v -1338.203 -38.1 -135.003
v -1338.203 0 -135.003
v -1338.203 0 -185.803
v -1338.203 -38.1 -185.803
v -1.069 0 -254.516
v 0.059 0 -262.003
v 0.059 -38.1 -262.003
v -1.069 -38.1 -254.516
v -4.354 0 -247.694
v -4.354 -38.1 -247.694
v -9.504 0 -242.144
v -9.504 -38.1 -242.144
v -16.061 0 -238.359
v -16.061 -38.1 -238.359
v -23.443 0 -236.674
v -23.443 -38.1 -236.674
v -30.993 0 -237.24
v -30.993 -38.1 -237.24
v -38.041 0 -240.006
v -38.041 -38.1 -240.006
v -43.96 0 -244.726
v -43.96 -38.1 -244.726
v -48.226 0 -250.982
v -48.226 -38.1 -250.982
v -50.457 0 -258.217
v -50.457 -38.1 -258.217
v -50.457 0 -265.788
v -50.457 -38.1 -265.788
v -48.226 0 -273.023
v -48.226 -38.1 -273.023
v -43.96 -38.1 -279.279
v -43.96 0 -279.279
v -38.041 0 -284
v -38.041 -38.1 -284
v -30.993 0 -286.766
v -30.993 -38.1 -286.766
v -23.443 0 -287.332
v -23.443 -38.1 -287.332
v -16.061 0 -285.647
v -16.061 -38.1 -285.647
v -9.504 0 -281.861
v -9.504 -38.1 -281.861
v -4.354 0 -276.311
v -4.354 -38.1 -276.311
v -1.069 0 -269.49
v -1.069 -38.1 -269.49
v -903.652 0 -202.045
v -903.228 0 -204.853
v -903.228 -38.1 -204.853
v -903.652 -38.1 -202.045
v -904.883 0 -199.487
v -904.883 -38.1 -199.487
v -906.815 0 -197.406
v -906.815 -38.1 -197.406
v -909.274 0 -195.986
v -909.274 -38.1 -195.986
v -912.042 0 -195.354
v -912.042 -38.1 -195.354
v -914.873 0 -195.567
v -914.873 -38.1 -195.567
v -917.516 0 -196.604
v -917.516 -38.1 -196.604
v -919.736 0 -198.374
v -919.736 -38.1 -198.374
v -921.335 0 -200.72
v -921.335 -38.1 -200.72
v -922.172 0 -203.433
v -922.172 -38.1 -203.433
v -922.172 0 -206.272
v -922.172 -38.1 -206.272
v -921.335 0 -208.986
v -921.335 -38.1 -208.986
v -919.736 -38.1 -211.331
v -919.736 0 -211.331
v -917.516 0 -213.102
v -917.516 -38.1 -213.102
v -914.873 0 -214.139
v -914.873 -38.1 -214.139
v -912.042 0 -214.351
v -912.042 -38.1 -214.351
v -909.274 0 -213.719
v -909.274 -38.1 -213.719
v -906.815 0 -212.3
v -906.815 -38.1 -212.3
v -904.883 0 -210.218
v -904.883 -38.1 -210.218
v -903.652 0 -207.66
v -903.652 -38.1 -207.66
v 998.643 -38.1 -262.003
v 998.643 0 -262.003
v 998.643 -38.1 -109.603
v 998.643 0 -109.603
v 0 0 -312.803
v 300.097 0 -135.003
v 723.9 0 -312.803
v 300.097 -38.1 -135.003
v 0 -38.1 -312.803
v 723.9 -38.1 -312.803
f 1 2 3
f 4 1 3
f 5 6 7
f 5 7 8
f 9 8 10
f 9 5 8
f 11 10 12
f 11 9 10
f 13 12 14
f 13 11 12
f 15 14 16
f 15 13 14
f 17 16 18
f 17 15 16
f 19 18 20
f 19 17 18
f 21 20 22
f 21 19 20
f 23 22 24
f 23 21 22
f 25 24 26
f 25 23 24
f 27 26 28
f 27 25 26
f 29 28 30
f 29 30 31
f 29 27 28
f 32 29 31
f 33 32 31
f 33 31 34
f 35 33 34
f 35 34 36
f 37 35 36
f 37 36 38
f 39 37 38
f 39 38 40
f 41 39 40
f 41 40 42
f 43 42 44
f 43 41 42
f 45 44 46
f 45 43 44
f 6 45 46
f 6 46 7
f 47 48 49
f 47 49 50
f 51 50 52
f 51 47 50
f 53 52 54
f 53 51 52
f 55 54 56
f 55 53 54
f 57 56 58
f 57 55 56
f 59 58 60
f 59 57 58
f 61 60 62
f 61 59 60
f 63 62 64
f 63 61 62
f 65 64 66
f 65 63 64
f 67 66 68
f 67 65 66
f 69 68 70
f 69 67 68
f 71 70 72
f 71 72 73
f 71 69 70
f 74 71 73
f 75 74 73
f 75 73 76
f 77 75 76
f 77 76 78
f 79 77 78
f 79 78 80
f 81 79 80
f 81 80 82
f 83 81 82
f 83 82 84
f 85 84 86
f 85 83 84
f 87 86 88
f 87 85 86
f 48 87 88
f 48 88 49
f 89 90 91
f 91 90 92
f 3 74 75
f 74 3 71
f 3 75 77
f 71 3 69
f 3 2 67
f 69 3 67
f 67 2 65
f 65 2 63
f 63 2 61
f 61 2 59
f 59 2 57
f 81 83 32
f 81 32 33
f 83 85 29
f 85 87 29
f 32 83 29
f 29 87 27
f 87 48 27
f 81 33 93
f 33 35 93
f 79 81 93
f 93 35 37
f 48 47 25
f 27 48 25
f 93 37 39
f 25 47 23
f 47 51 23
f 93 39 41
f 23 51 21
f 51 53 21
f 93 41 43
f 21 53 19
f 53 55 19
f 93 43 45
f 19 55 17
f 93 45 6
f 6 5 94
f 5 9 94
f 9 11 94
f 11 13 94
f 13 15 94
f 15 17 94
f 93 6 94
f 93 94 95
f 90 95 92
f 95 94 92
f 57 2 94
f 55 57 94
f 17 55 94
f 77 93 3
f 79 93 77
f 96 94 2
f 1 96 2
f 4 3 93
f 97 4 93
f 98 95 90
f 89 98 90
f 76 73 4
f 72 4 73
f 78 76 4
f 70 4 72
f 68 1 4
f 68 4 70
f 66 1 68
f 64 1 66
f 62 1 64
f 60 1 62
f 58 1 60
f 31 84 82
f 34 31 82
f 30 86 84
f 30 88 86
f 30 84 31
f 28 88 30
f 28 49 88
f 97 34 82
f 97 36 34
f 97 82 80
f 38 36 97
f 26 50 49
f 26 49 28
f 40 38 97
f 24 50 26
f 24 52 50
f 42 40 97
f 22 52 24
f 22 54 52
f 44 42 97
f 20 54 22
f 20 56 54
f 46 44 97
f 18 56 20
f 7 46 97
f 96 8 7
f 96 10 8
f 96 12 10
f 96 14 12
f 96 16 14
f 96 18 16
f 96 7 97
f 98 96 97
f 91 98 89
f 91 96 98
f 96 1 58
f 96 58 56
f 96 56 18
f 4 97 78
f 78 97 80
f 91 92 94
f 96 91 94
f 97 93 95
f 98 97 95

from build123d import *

# Parameters (mm, degrees)
F0_R     = 25.4
F0_R_2   = 9.525
F1_DEPTH = 38.1


with BuildPart() as f1:
    # F0 (on Front) → F1 (new body)
    with BuildSketch(Plane.XZ):
        Polygon((300.096595, -135.002792), (-1338.203405, -135.002792), (-1338.203405, -185.802792), (0, -312.802792), (723.9, -312.802792), (998.643007, -262.002792), (998.643007, -109.602792), align=None)
        with Locations((-25.340905, -262.002792)):
            Circle(F0_R, mode=Mode.SUBTRACT)
        with Locations((-912.753405, -204.852792)):
            Circle(F0_R_2, mode=Mode.SUBTRACT)
    extrude(amount=F1_DEPTH)


solid = f1.part
